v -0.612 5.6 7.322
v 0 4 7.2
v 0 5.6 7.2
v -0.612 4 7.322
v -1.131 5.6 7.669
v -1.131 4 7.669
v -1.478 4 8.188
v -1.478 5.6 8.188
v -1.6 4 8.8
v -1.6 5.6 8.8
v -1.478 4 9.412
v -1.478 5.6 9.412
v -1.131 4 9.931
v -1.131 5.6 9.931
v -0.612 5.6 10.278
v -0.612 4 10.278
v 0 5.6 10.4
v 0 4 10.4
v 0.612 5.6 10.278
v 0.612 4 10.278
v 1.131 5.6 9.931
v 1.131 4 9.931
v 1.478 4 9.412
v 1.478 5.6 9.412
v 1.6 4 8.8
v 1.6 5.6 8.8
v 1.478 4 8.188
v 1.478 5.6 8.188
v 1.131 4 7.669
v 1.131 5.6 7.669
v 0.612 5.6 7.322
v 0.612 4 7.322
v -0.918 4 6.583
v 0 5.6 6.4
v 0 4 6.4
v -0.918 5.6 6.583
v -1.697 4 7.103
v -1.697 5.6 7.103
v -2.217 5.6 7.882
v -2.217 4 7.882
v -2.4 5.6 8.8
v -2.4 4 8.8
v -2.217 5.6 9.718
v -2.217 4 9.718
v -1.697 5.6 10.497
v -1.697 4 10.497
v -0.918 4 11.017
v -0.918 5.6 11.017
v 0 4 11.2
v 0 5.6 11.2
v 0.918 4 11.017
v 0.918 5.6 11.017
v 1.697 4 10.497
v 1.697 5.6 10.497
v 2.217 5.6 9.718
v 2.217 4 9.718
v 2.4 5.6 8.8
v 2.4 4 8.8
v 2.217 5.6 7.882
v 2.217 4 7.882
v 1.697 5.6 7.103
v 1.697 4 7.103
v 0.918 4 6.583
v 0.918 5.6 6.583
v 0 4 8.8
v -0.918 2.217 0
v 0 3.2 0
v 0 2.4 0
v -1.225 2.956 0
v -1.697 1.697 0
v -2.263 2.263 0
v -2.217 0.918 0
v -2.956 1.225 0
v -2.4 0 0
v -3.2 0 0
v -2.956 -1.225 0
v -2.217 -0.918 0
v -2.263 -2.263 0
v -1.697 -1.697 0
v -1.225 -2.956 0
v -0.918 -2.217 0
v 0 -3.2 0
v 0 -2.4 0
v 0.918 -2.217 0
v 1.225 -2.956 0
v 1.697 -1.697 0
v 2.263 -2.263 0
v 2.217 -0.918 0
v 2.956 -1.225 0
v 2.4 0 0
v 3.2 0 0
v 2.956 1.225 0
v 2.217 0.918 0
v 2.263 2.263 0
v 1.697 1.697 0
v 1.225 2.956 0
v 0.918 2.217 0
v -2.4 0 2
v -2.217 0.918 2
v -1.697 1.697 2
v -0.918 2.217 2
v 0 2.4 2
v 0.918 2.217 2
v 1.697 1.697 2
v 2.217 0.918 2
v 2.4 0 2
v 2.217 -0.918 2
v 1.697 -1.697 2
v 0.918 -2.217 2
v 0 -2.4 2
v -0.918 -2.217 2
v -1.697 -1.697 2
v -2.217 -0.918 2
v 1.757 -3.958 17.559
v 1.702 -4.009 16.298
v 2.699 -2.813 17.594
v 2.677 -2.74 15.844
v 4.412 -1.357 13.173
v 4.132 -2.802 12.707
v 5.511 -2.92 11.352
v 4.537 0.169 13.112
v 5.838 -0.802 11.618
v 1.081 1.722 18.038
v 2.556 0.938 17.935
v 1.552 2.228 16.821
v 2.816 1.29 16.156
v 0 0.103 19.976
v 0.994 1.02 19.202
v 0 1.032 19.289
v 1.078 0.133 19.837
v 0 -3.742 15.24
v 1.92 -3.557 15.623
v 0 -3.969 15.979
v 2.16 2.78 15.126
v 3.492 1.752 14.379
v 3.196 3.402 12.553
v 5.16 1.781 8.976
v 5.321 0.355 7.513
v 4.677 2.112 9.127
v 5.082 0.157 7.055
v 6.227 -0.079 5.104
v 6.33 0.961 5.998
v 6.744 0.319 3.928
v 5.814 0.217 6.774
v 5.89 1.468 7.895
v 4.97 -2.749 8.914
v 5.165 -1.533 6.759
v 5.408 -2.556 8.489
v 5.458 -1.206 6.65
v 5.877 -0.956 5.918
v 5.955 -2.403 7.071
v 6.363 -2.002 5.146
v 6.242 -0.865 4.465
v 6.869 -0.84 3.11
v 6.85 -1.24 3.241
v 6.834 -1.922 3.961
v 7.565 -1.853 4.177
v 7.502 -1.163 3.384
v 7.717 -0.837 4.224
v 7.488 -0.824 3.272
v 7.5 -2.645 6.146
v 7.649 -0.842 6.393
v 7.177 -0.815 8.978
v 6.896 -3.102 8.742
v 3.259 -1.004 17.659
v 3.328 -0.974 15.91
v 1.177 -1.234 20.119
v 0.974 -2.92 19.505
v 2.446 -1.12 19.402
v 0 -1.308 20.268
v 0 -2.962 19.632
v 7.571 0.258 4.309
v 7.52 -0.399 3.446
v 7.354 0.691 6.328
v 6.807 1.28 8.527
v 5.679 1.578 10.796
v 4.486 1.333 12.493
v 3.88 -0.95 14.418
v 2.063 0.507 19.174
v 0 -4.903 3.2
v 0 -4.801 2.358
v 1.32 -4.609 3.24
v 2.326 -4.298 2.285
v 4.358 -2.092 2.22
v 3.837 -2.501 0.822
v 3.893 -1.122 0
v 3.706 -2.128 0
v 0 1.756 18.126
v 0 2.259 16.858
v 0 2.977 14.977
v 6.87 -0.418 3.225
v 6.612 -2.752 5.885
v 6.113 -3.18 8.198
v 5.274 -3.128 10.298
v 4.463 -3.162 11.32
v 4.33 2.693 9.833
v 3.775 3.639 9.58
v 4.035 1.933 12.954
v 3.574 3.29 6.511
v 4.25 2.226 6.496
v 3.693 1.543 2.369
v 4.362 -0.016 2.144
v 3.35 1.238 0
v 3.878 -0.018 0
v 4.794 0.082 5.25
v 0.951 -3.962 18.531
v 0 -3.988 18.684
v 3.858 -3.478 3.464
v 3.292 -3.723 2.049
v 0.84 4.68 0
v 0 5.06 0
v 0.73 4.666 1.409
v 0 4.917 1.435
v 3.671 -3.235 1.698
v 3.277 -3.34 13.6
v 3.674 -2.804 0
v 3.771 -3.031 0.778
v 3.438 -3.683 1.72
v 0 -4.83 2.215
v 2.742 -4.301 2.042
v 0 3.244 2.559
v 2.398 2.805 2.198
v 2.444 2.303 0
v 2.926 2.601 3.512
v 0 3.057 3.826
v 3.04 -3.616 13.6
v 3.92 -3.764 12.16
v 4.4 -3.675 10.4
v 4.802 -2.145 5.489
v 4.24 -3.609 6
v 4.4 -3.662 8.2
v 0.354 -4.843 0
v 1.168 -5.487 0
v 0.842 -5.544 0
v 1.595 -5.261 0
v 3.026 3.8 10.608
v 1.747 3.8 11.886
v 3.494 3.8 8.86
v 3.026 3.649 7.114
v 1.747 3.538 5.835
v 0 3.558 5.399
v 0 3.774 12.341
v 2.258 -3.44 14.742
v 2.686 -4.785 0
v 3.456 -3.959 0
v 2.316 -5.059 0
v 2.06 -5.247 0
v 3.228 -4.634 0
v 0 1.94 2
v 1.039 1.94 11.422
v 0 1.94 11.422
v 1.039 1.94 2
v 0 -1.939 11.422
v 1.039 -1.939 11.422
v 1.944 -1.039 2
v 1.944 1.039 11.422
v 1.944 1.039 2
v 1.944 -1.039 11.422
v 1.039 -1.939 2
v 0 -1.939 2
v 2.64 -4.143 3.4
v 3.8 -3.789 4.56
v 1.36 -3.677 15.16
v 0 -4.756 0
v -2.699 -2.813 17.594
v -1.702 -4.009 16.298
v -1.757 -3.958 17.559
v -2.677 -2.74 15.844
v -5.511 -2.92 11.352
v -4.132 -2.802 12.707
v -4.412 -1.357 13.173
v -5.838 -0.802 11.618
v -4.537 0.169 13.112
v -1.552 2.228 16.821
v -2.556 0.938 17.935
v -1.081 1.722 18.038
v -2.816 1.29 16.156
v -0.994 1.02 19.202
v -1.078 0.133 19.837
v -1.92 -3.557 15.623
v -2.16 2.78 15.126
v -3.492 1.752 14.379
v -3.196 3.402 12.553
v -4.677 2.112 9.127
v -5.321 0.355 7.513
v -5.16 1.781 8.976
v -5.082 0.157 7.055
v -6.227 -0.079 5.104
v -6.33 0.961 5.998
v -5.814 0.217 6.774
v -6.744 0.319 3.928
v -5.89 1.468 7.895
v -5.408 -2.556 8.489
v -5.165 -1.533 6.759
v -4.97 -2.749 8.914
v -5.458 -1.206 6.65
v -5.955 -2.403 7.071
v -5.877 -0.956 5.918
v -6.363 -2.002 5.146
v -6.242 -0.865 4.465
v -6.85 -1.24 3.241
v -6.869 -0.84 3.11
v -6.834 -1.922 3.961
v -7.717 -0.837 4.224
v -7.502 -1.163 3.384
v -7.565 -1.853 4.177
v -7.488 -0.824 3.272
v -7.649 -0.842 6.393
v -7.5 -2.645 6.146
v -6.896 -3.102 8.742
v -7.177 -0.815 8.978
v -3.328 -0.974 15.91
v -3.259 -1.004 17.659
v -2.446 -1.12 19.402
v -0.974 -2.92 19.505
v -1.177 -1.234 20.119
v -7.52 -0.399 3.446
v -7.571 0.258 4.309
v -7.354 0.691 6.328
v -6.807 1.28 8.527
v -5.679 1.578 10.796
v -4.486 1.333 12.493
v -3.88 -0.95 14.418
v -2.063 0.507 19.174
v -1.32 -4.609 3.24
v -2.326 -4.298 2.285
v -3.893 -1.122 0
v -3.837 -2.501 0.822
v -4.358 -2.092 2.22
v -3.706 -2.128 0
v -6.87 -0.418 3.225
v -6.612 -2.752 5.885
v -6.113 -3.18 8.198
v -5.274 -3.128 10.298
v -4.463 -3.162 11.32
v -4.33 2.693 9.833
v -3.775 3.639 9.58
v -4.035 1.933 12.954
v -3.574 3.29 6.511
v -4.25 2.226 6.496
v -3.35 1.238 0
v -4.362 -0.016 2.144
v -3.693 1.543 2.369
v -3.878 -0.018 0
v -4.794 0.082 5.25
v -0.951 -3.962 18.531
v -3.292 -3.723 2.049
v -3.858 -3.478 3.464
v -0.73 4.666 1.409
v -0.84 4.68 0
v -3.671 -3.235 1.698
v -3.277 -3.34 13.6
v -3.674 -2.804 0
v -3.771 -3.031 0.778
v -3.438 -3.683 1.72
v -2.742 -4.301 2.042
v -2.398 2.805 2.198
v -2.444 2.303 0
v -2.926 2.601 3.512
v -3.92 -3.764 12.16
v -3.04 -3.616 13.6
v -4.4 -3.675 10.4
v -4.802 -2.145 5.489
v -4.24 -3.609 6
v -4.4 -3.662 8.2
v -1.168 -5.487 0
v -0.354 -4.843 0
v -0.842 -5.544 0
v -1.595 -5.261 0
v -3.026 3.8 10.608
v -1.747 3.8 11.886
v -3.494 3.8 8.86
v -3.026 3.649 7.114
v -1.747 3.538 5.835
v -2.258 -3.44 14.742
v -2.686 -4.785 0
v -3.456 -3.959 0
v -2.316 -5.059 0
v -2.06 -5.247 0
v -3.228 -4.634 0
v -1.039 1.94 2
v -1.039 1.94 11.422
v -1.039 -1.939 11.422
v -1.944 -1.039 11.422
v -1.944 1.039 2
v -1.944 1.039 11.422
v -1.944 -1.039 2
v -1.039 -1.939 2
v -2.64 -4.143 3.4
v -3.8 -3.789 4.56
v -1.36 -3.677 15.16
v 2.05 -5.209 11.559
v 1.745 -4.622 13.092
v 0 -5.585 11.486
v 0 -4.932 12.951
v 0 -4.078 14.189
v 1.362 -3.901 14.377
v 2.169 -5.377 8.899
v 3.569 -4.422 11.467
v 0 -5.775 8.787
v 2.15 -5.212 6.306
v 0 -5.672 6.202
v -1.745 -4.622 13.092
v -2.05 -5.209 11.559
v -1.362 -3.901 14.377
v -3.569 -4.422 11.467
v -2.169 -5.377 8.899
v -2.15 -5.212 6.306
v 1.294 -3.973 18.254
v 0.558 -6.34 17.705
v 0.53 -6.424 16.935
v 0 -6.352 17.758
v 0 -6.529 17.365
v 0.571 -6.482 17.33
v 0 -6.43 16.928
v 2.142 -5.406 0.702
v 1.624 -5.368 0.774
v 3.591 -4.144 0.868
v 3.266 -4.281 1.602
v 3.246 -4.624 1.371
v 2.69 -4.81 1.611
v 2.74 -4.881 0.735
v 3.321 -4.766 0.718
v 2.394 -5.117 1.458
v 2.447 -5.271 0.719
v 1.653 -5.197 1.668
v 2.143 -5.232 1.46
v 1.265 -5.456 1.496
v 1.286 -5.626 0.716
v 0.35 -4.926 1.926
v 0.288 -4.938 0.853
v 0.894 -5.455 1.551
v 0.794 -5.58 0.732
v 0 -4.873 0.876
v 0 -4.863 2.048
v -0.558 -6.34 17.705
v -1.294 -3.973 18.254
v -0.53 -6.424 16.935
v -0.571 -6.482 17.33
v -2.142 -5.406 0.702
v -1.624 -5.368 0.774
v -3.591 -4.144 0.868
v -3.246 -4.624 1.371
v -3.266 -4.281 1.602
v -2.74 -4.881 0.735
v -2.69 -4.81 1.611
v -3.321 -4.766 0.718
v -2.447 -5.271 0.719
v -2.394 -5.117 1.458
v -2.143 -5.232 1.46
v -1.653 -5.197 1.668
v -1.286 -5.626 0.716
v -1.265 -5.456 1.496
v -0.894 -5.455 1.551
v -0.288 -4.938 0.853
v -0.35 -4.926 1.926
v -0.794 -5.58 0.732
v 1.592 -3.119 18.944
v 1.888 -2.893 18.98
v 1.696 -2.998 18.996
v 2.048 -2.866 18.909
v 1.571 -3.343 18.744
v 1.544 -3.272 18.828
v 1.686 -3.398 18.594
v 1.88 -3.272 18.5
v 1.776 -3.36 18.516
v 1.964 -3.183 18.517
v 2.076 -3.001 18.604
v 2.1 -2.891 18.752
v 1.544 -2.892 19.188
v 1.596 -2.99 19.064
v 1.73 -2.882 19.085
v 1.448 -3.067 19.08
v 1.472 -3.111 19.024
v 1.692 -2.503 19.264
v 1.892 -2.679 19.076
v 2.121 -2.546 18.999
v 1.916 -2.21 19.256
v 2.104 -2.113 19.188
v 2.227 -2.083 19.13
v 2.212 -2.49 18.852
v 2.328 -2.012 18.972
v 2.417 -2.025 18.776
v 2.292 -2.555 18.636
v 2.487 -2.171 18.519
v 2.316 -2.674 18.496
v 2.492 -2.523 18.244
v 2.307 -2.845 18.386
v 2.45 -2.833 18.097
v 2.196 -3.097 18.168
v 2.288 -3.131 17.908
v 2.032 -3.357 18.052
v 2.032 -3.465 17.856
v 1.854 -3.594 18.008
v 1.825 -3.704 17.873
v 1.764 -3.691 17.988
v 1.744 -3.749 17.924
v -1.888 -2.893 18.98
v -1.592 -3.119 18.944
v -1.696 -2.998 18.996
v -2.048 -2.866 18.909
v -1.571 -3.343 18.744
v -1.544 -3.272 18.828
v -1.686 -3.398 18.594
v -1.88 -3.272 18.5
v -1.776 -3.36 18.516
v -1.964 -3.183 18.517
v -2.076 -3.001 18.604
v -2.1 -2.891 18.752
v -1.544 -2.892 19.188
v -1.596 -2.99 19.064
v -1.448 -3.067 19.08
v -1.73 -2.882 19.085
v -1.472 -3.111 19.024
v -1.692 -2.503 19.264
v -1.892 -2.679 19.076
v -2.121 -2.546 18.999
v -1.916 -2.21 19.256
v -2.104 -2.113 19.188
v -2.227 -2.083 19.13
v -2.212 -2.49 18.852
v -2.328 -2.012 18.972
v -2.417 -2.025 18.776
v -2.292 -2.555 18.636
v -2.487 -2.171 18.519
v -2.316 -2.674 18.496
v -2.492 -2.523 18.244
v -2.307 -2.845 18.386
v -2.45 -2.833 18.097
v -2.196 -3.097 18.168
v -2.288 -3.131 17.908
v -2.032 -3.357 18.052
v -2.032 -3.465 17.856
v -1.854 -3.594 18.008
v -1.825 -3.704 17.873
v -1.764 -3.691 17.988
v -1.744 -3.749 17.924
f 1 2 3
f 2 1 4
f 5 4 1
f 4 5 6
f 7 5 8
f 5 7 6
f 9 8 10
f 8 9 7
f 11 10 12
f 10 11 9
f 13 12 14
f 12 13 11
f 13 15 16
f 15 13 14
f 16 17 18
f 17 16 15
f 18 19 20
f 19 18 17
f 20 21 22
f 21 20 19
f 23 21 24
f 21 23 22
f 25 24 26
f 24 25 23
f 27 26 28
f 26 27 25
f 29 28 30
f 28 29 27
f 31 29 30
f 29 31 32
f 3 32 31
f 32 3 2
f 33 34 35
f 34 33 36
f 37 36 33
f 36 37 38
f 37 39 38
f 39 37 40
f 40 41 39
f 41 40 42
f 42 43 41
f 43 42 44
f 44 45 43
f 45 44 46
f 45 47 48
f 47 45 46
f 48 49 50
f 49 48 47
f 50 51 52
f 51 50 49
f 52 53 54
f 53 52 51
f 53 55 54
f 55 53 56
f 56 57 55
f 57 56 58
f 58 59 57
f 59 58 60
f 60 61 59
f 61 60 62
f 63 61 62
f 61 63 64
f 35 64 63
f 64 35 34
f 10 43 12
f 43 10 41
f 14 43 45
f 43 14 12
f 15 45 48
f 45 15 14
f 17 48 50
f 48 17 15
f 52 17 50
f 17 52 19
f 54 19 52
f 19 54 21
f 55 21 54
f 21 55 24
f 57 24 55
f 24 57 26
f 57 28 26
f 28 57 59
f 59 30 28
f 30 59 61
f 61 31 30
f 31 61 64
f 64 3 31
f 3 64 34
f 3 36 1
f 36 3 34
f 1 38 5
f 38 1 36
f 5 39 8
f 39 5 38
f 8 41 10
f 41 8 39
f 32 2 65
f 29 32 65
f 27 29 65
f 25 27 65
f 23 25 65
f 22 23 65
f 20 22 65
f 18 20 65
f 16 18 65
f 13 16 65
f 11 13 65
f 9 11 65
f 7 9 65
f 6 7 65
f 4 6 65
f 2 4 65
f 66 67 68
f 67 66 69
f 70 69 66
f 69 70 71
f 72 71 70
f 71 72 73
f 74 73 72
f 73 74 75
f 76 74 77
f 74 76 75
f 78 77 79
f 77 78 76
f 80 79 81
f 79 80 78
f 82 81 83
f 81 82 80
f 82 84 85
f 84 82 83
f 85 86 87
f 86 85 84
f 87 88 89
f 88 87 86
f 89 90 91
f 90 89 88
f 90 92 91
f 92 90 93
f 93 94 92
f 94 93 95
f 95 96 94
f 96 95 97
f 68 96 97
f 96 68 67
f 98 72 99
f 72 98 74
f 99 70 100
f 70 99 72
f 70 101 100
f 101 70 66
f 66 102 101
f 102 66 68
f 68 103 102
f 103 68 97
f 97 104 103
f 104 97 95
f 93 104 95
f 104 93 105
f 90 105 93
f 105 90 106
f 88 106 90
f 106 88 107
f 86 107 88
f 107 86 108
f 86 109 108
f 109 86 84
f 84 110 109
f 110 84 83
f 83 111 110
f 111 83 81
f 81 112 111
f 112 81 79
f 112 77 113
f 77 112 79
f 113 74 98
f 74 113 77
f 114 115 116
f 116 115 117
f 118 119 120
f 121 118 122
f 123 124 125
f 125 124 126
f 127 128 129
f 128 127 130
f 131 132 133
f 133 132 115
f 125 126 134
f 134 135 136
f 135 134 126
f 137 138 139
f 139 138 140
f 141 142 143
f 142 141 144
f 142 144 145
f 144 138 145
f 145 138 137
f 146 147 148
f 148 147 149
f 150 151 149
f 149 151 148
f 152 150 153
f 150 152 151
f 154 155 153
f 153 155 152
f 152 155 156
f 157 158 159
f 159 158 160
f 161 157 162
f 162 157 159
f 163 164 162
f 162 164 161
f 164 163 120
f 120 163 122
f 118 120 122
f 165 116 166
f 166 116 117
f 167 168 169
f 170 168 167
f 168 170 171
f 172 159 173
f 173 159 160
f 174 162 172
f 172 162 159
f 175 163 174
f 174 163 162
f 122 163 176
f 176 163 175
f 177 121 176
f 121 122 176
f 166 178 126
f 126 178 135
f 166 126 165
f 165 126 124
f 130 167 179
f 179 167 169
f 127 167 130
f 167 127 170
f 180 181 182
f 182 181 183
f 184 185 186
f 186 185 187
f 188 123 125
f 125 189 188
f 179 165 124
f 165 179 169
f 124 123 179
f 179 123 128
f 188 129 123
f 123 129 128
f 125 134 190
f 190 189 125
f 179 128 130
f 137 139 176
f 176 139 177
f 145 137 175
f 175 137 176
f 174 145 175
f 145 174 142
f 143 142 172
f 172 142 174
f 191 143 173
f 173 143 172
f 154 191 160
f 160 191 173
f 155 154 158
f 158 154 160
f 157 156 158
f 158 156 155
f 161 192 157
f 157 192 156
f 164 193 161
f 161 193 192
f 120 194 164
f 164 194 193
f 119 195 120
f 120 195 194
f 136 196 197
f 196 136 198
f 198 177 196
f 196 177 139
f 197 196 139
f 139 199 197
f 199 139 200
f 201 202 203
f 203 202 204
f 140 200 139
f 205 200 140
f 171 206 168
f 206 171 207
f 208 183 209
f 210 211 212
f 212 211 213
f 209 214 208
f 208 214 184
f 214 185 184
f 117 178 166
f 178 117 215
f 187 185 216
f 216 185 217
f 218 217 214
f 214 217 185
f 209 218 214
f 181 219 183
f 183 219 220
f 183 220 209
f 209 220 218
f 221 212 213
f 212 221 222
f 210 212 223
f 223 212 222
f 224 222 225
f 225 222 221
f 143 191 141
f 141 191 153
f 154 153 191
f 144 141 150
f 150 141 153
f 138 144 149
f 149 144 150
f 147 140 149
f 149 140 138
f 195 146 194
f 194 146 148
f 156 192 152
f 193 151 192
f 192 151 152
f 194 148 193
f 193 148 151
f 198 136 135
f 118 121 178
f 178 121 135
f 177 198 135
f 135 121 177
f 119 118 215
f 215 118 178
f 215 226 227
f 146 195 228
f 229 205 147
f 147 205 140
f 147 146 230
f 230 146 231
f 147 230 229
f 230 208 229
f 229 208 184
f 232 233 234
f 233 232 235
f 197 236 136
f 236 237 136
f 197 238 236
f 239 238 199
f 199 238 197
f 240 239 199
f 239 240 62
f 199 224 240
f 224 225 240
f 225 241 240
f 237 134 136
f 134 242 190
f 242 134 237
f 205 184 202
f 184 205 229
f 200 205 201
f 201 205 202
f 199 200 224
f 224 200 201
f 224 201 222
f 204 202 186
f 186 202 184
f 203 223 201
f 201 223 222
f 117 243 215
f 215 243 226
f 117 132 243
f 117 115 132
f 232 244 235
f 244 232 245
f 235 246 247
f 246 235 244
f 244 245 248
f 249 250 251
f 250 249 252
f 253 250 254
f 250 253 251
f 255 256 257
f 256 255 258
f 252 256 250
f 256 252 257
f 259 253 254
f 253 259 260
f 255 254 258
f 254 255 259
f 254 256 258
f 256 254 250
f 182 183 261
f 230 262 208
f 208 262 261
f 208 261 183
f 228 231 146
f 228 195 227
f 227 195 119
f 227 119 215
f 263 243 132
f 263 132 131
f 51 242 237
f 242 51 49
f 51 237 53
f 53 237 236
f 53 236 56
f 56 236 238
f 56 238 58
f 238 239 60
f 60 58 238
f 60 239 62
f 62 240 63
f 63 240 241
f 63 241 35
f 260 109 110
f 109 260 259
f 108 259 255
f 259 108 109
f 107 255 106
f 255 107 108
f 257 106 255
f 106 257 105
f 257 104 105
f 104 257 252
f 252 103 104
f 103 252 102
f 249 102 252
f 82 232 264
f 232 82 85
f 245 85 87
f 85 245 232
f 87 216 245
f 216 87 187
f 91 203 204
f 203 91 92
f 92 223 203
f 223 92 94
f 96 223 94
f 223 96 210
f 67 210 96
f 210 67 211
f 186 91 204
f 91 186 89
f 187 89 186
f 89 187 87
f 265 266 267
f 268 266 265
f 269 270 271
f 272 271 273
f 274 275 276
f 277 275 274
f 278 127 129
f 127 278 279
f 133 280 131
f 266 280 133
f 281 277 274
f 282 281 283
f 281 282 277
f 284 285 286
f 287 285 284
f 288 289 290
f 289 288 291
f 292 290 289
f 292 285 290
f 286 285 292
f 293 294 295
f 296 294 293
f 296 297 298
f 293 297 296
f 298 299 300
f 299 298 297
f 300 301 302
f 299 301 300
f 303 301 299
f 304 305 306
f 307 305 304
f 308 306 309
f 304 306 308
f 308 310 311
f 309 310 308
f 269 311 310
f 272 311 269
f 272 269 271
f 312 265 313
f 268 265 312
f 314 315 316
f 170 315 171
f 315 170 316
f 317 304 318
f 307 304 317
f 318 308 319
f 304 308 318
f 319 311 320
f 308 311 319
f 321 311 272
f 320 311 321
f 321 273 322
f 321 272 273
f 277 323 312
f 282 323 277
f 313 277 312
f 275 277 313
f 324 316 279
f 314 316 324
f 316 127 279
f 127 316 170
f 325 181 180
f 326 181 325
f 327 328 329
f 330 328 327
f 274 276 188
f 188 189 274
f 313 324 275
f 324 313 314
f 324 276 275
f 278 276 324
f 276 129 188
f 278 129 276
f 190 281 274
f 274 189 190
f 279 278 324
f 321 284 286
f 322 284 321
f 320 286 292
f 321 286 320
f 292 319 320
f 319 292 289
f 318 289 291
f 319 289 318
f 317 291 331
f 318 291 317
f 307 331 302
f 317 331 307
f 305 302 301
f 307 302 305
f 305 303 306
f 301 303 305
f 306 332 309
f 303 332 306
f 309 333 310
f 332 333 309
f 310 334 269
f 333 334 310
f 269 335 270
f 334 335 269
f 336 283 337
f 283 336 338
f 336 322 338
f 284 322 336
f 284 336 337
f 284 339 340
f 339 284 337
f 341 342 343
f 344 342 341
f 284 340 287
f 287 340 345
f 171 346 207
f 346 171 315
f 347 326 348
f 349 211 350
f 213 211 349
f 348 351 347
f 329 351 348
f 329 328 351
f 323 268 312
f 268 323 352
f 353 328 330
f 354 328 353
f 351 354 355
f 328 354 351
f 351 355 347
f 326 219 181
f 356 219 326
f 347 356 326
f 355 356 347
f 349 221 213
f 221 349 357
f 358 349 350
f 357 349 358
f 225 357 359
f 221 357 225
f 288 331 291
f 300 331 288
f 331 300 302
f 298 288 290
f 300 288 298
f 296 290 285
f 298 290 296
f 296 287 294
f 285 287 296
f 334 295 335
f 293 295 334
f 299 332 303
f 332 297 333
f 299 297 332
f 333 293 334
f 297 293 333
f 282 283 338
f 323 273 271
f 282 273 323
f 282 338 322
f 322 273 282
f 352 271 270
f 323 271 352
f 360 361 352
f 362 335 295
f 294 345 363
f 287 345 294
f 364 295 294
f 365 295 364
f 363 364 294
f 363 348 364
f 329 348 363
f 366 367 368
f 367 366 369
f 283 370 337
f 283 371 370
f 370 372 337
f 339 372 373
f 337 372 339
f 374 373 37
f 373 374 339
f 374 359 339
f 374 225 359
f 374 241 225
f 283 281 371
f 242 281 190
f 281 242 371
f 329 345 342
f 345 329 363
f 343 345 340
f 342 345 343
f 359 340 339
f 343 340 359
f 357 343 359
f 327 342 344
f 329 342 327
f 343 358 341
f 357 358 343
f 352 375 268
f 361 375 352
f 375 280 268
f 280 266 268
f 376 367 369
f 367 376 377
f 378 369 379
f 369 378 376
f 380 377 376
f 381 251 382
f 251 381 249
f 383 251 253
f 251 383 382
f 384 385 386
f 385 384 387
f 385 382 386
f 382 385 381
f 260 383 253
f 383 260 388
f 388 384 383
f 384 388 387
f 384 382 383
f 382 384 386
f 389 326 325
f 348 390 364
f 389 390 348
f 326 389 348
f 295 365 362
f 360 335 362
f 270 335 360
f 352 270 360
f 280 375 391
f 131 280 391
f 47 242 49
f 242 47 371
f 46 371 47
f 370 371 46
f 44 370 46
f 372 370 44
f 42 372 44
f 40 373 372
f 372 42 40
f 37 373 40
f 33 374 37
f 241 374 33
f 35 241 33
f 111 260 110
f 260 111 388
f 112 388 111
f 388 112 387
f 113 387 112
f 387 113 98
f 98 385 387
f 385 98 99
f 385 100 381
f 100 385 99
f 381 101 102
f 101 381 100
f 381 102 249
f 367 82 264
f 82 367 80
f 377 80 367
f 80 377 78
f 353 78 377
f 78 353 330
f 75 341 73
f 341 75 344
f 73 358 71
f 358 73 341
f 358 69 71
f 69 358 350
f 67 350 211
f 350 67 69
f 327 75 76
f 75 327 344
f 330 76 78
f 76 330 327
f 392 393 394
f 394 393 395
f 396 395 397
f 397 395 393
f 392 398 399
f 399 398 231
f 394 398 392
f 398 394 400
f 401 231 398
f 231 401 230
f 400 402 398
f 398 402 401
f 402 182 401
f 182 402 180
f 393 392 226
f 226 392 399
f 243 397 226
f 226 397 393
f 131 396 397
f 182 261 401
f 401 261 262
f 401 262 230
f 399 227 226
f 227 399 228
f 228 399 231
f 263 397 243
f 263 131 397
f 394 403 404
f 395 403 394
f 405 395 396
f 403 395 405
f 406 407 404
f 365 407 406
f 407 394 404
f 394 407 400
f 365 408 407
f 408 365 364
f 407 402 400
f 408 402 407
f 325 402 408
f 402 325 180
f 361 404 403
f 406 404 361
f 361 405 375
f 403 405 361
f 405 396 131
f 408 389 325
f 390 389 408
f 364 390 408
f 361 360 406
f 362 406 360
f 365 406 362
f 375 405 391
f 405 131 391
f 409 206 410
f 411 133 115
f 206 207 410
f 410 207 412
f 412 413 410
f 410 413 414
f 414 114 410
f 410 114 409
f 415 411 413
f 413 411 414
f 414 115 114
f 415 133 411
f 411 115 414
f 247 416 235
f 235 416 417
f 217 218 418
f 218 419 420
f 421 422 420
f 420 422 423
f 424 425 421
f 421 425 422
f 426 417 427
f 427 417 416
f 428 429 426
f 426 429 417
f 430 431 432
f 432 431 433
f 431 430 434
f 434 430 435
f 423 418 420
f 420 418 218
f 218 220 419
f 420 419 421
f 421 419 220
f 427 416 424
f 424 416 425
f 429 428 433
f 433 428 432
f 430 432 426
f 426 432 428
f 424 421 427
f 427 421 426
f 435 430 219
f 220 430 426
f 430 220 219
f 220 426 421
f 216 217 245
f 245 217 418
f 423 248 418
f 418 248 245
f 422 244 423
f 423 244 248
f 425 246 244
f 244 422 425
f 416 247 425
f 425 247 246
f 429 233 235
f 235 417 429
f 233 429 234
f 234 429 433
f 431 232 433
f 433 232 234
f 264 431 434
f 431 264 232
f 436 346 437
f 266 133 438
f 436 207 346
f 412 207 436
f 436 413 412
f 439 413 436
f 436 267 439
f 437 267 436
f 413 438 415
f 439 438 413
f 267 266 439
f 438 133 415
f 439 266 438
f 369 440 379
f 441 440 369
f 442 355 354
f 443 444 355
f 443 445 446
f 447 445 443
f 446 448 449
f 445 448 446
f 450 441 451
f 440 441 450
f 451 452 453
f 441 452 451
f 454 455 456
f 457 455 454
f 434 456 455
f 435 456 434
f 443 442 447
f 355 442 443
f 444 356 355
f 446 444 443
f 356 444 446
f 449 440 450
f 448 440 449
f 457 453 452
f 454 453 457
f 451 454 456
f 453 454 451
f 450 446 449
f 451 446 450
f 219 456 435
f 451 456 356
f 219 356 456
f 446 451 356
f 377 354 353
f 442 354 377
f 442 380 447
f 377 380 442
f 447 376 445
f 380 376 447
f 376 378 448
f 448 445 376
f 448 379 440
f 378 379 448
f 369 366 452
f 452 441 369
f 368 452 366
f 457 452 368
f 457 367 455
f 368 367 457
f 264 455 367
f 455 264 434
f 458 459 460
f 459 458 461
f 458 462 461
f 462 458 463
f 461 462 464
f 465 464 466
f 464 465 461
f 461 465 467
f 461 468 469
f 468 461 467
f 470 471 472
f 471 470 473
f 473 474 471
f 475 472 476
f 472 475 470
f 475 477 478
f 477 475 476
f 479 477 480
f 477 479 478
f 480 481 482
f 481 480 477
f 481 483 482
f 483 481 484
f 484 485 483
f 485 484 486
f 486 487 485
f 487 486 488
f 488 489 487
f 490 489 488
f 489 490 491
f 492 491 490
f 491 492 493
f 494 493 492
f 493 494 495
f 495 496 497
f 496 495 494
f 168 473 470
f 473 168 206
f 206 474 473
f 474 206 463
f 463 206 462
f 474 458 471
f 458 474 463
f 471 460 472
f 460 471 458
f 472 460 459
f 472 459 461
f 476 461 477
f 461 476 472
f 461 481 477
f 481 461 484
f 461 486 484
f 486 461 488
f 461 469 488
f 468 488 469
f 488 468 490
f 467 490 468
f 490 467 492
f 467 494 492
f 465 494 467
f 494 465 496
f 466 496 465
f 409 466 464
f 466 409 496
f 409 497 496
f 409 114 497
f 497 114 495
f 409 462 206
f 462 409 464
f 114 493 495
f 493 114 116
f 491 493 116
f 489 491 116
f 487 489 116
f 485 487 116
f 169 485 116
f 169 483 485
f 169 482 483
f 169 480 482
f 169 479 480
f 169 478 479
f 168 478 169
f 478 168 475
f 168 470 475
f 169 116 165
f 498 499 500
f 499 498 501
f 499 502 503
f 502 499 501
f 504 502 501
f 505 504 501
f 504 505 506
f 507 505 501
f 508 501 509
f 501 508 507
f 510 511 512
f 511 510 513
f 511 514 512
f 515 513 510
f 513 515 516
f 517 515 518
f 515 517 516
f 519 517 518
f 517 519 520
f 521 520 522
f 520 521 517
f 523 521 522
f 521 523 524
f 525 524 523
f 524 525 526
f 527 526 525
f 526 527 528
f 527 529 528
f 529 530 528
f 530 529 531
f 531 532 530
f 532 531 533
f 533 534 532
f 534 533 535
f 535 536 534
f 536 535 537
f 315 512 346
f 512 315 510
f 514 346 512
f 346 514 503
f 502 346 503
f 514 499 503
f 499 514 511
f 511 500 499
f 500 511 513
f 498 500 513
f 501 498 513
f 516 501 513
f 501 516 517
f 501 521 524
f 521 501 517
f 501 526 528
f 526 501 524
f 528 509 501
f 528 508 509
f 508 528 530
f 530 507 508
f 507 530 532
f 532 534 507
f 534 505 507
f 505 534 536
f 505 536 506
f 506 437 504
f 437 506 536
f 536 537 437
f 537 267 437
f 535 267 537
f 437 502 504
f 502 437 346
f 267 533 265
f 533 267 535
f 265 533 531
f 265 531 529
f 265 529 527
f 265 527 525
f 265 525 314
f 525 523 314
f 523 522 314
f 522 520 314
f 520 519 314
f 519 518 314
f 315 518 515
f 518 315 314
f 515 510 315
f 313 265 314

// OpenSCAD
use <../lib.scad>
use <../p/4-4disc.scad>
use <s/26074p01s01.scad>
use <s/26074s01.scad>
use <s/26074s02.scad>
use <s/26074s03.scad>
use <s/26074s04.scad>
use <../p/stud2.scad>
use <../p/stud4od.scad>
function ldraw_lib__26074p01() = [
// 0 Animal Penguin with White Belly and Eyes and Orange Beak and Feet Pattern
// 0 Name: 26074p01.dat
// 0 Author: Philippe Hurbain [Philo]
// 0 !LDRAW_ORG Part UPDATE 2018-02
// 0 !LICENSE Licensed under CC BY 2.0 and CC BY 4.0 : see CAreadme.txt
// 
// 0 BFC CERTIFY CCW
  [0,"BFC","CERTIFY"],
  [0,"BFC","CCW"],
// 
// 0 !HISTORY 2018-01-09 {LEGO Digital Designer} Original part shape
// 0 !HISTORY 2018-01-30 [Philo] File preparation for LDraw Parts Tracker
// 0 !HISTORY 2018-12-08 [PTadmin] Official Update 2018-02
// 
// 
// 1 16 0 -22 10 0 0 -1 1 0 0 0 -1 0 stud2.dat
  [1,16,0,-22,10,0,0,-1,1,0,0,0,-1,0, ldraw_lib__stud2()],
// 1 16 0 -22 10 0 0 4 4 0 0 0 -1 0 4-4disc.dat
  [1,16,0,-22,10,0,0,4,4,0,0,0,-1,0, ldraw_lib__4_4disc()],
// 1 16 0 -5 0 1 0 0 0 -1.25 0 0 0 1 stud4od.dat
  [1,16,0,-5,0,1,0,0,0,-1.25,0,0,0,1, ldraw_lib__stud4od()],
// 
// 1 16 0 0 0 1 0 0 0 1 0 0 0 1 s\26074s01.dat
  [1,16,0,0,0,1,0,0,0,1,0,0,0,1, ldraw_lib__s__26074s01()],
// 1 16 0 0 0 -1 0 0 0 1 0 0 0 1 s\26074s01.dat
  [1,16,0,0,0,-1,0,0,0,1,0,0,0,1, ldraw_lib__s__26074s01()],
// 1 15 0 0 0 1 0 0 0 1 0 0 0 1 s\26074s02.dat
  [1,15,0,0,0,1,0,0,0,1,0,0,0,1, ldraw_lib__s__26074s02()],
// 1 15 0 0 0 -1 0 0 0 1 0 0 0 1 s\26074s02.dat
  [1,15,0,0,0,-1,0,0,0,1,0,0,0,1, ldraw_lib__s__26074s02()],
// 1 25 0 0 0 1 0 0 0 1 0 0 0 1 s\26074s03.dat
  [1,25,0,0,0,1,0,0,0,1,0,0,0,1, ldraw_lib__s__26074s03()],
// 1 25 0 0 0 1 0 0 0 1 0 0 0 1 s\26074s04.dat
  [1,25,0,0,0,1,0,0,0,1,0,0,0,1, ldraw_lib__s__26074s04()],
// 1 25 0 0 0 -1 0 0 0 1 0 0 0 1 s\26074s03.dat
  [1,25,0,0,0,-1,0,0,0,1,0,0,0,1, ldraw_lib__s__26074s03()],
// 1 25 0 0 0 -1 0 0 0 1 0 0 0 1 s\26074s04.dat
  [1,25,0,0,0,-1,0,0,0,1,0,0,0,1, ldraw_lib__s__26074s04()],
// 1 16 0 0 0 1 0 0 0 1 0 0 0 1 s\26074p01s01.dat
  [1,16,0,0,0,1,0,0,0,1,0,0,0,1, ldraw_lib__s__26074p01s01()],
// 1 16 0 0 0 -1 0 0 0 1 0 0 0 1 s\26074p01s01.dat
  [1,16,0,0,0,-1,0,0,0,1,0,0,0,1, ldraw_lib__s__26074p01s01()],
];
module ldraw_lib__26074p01(step=0, col=false, unit=2/5, alt=false, line=0.2, solid=!$preview)
    makepoly(ldraw_lib__26074p01(), step=step, col=col, unit=unit, alt=alt, line=line, solid=solid);
ldraw_lib__26074p01(line=0.2);
